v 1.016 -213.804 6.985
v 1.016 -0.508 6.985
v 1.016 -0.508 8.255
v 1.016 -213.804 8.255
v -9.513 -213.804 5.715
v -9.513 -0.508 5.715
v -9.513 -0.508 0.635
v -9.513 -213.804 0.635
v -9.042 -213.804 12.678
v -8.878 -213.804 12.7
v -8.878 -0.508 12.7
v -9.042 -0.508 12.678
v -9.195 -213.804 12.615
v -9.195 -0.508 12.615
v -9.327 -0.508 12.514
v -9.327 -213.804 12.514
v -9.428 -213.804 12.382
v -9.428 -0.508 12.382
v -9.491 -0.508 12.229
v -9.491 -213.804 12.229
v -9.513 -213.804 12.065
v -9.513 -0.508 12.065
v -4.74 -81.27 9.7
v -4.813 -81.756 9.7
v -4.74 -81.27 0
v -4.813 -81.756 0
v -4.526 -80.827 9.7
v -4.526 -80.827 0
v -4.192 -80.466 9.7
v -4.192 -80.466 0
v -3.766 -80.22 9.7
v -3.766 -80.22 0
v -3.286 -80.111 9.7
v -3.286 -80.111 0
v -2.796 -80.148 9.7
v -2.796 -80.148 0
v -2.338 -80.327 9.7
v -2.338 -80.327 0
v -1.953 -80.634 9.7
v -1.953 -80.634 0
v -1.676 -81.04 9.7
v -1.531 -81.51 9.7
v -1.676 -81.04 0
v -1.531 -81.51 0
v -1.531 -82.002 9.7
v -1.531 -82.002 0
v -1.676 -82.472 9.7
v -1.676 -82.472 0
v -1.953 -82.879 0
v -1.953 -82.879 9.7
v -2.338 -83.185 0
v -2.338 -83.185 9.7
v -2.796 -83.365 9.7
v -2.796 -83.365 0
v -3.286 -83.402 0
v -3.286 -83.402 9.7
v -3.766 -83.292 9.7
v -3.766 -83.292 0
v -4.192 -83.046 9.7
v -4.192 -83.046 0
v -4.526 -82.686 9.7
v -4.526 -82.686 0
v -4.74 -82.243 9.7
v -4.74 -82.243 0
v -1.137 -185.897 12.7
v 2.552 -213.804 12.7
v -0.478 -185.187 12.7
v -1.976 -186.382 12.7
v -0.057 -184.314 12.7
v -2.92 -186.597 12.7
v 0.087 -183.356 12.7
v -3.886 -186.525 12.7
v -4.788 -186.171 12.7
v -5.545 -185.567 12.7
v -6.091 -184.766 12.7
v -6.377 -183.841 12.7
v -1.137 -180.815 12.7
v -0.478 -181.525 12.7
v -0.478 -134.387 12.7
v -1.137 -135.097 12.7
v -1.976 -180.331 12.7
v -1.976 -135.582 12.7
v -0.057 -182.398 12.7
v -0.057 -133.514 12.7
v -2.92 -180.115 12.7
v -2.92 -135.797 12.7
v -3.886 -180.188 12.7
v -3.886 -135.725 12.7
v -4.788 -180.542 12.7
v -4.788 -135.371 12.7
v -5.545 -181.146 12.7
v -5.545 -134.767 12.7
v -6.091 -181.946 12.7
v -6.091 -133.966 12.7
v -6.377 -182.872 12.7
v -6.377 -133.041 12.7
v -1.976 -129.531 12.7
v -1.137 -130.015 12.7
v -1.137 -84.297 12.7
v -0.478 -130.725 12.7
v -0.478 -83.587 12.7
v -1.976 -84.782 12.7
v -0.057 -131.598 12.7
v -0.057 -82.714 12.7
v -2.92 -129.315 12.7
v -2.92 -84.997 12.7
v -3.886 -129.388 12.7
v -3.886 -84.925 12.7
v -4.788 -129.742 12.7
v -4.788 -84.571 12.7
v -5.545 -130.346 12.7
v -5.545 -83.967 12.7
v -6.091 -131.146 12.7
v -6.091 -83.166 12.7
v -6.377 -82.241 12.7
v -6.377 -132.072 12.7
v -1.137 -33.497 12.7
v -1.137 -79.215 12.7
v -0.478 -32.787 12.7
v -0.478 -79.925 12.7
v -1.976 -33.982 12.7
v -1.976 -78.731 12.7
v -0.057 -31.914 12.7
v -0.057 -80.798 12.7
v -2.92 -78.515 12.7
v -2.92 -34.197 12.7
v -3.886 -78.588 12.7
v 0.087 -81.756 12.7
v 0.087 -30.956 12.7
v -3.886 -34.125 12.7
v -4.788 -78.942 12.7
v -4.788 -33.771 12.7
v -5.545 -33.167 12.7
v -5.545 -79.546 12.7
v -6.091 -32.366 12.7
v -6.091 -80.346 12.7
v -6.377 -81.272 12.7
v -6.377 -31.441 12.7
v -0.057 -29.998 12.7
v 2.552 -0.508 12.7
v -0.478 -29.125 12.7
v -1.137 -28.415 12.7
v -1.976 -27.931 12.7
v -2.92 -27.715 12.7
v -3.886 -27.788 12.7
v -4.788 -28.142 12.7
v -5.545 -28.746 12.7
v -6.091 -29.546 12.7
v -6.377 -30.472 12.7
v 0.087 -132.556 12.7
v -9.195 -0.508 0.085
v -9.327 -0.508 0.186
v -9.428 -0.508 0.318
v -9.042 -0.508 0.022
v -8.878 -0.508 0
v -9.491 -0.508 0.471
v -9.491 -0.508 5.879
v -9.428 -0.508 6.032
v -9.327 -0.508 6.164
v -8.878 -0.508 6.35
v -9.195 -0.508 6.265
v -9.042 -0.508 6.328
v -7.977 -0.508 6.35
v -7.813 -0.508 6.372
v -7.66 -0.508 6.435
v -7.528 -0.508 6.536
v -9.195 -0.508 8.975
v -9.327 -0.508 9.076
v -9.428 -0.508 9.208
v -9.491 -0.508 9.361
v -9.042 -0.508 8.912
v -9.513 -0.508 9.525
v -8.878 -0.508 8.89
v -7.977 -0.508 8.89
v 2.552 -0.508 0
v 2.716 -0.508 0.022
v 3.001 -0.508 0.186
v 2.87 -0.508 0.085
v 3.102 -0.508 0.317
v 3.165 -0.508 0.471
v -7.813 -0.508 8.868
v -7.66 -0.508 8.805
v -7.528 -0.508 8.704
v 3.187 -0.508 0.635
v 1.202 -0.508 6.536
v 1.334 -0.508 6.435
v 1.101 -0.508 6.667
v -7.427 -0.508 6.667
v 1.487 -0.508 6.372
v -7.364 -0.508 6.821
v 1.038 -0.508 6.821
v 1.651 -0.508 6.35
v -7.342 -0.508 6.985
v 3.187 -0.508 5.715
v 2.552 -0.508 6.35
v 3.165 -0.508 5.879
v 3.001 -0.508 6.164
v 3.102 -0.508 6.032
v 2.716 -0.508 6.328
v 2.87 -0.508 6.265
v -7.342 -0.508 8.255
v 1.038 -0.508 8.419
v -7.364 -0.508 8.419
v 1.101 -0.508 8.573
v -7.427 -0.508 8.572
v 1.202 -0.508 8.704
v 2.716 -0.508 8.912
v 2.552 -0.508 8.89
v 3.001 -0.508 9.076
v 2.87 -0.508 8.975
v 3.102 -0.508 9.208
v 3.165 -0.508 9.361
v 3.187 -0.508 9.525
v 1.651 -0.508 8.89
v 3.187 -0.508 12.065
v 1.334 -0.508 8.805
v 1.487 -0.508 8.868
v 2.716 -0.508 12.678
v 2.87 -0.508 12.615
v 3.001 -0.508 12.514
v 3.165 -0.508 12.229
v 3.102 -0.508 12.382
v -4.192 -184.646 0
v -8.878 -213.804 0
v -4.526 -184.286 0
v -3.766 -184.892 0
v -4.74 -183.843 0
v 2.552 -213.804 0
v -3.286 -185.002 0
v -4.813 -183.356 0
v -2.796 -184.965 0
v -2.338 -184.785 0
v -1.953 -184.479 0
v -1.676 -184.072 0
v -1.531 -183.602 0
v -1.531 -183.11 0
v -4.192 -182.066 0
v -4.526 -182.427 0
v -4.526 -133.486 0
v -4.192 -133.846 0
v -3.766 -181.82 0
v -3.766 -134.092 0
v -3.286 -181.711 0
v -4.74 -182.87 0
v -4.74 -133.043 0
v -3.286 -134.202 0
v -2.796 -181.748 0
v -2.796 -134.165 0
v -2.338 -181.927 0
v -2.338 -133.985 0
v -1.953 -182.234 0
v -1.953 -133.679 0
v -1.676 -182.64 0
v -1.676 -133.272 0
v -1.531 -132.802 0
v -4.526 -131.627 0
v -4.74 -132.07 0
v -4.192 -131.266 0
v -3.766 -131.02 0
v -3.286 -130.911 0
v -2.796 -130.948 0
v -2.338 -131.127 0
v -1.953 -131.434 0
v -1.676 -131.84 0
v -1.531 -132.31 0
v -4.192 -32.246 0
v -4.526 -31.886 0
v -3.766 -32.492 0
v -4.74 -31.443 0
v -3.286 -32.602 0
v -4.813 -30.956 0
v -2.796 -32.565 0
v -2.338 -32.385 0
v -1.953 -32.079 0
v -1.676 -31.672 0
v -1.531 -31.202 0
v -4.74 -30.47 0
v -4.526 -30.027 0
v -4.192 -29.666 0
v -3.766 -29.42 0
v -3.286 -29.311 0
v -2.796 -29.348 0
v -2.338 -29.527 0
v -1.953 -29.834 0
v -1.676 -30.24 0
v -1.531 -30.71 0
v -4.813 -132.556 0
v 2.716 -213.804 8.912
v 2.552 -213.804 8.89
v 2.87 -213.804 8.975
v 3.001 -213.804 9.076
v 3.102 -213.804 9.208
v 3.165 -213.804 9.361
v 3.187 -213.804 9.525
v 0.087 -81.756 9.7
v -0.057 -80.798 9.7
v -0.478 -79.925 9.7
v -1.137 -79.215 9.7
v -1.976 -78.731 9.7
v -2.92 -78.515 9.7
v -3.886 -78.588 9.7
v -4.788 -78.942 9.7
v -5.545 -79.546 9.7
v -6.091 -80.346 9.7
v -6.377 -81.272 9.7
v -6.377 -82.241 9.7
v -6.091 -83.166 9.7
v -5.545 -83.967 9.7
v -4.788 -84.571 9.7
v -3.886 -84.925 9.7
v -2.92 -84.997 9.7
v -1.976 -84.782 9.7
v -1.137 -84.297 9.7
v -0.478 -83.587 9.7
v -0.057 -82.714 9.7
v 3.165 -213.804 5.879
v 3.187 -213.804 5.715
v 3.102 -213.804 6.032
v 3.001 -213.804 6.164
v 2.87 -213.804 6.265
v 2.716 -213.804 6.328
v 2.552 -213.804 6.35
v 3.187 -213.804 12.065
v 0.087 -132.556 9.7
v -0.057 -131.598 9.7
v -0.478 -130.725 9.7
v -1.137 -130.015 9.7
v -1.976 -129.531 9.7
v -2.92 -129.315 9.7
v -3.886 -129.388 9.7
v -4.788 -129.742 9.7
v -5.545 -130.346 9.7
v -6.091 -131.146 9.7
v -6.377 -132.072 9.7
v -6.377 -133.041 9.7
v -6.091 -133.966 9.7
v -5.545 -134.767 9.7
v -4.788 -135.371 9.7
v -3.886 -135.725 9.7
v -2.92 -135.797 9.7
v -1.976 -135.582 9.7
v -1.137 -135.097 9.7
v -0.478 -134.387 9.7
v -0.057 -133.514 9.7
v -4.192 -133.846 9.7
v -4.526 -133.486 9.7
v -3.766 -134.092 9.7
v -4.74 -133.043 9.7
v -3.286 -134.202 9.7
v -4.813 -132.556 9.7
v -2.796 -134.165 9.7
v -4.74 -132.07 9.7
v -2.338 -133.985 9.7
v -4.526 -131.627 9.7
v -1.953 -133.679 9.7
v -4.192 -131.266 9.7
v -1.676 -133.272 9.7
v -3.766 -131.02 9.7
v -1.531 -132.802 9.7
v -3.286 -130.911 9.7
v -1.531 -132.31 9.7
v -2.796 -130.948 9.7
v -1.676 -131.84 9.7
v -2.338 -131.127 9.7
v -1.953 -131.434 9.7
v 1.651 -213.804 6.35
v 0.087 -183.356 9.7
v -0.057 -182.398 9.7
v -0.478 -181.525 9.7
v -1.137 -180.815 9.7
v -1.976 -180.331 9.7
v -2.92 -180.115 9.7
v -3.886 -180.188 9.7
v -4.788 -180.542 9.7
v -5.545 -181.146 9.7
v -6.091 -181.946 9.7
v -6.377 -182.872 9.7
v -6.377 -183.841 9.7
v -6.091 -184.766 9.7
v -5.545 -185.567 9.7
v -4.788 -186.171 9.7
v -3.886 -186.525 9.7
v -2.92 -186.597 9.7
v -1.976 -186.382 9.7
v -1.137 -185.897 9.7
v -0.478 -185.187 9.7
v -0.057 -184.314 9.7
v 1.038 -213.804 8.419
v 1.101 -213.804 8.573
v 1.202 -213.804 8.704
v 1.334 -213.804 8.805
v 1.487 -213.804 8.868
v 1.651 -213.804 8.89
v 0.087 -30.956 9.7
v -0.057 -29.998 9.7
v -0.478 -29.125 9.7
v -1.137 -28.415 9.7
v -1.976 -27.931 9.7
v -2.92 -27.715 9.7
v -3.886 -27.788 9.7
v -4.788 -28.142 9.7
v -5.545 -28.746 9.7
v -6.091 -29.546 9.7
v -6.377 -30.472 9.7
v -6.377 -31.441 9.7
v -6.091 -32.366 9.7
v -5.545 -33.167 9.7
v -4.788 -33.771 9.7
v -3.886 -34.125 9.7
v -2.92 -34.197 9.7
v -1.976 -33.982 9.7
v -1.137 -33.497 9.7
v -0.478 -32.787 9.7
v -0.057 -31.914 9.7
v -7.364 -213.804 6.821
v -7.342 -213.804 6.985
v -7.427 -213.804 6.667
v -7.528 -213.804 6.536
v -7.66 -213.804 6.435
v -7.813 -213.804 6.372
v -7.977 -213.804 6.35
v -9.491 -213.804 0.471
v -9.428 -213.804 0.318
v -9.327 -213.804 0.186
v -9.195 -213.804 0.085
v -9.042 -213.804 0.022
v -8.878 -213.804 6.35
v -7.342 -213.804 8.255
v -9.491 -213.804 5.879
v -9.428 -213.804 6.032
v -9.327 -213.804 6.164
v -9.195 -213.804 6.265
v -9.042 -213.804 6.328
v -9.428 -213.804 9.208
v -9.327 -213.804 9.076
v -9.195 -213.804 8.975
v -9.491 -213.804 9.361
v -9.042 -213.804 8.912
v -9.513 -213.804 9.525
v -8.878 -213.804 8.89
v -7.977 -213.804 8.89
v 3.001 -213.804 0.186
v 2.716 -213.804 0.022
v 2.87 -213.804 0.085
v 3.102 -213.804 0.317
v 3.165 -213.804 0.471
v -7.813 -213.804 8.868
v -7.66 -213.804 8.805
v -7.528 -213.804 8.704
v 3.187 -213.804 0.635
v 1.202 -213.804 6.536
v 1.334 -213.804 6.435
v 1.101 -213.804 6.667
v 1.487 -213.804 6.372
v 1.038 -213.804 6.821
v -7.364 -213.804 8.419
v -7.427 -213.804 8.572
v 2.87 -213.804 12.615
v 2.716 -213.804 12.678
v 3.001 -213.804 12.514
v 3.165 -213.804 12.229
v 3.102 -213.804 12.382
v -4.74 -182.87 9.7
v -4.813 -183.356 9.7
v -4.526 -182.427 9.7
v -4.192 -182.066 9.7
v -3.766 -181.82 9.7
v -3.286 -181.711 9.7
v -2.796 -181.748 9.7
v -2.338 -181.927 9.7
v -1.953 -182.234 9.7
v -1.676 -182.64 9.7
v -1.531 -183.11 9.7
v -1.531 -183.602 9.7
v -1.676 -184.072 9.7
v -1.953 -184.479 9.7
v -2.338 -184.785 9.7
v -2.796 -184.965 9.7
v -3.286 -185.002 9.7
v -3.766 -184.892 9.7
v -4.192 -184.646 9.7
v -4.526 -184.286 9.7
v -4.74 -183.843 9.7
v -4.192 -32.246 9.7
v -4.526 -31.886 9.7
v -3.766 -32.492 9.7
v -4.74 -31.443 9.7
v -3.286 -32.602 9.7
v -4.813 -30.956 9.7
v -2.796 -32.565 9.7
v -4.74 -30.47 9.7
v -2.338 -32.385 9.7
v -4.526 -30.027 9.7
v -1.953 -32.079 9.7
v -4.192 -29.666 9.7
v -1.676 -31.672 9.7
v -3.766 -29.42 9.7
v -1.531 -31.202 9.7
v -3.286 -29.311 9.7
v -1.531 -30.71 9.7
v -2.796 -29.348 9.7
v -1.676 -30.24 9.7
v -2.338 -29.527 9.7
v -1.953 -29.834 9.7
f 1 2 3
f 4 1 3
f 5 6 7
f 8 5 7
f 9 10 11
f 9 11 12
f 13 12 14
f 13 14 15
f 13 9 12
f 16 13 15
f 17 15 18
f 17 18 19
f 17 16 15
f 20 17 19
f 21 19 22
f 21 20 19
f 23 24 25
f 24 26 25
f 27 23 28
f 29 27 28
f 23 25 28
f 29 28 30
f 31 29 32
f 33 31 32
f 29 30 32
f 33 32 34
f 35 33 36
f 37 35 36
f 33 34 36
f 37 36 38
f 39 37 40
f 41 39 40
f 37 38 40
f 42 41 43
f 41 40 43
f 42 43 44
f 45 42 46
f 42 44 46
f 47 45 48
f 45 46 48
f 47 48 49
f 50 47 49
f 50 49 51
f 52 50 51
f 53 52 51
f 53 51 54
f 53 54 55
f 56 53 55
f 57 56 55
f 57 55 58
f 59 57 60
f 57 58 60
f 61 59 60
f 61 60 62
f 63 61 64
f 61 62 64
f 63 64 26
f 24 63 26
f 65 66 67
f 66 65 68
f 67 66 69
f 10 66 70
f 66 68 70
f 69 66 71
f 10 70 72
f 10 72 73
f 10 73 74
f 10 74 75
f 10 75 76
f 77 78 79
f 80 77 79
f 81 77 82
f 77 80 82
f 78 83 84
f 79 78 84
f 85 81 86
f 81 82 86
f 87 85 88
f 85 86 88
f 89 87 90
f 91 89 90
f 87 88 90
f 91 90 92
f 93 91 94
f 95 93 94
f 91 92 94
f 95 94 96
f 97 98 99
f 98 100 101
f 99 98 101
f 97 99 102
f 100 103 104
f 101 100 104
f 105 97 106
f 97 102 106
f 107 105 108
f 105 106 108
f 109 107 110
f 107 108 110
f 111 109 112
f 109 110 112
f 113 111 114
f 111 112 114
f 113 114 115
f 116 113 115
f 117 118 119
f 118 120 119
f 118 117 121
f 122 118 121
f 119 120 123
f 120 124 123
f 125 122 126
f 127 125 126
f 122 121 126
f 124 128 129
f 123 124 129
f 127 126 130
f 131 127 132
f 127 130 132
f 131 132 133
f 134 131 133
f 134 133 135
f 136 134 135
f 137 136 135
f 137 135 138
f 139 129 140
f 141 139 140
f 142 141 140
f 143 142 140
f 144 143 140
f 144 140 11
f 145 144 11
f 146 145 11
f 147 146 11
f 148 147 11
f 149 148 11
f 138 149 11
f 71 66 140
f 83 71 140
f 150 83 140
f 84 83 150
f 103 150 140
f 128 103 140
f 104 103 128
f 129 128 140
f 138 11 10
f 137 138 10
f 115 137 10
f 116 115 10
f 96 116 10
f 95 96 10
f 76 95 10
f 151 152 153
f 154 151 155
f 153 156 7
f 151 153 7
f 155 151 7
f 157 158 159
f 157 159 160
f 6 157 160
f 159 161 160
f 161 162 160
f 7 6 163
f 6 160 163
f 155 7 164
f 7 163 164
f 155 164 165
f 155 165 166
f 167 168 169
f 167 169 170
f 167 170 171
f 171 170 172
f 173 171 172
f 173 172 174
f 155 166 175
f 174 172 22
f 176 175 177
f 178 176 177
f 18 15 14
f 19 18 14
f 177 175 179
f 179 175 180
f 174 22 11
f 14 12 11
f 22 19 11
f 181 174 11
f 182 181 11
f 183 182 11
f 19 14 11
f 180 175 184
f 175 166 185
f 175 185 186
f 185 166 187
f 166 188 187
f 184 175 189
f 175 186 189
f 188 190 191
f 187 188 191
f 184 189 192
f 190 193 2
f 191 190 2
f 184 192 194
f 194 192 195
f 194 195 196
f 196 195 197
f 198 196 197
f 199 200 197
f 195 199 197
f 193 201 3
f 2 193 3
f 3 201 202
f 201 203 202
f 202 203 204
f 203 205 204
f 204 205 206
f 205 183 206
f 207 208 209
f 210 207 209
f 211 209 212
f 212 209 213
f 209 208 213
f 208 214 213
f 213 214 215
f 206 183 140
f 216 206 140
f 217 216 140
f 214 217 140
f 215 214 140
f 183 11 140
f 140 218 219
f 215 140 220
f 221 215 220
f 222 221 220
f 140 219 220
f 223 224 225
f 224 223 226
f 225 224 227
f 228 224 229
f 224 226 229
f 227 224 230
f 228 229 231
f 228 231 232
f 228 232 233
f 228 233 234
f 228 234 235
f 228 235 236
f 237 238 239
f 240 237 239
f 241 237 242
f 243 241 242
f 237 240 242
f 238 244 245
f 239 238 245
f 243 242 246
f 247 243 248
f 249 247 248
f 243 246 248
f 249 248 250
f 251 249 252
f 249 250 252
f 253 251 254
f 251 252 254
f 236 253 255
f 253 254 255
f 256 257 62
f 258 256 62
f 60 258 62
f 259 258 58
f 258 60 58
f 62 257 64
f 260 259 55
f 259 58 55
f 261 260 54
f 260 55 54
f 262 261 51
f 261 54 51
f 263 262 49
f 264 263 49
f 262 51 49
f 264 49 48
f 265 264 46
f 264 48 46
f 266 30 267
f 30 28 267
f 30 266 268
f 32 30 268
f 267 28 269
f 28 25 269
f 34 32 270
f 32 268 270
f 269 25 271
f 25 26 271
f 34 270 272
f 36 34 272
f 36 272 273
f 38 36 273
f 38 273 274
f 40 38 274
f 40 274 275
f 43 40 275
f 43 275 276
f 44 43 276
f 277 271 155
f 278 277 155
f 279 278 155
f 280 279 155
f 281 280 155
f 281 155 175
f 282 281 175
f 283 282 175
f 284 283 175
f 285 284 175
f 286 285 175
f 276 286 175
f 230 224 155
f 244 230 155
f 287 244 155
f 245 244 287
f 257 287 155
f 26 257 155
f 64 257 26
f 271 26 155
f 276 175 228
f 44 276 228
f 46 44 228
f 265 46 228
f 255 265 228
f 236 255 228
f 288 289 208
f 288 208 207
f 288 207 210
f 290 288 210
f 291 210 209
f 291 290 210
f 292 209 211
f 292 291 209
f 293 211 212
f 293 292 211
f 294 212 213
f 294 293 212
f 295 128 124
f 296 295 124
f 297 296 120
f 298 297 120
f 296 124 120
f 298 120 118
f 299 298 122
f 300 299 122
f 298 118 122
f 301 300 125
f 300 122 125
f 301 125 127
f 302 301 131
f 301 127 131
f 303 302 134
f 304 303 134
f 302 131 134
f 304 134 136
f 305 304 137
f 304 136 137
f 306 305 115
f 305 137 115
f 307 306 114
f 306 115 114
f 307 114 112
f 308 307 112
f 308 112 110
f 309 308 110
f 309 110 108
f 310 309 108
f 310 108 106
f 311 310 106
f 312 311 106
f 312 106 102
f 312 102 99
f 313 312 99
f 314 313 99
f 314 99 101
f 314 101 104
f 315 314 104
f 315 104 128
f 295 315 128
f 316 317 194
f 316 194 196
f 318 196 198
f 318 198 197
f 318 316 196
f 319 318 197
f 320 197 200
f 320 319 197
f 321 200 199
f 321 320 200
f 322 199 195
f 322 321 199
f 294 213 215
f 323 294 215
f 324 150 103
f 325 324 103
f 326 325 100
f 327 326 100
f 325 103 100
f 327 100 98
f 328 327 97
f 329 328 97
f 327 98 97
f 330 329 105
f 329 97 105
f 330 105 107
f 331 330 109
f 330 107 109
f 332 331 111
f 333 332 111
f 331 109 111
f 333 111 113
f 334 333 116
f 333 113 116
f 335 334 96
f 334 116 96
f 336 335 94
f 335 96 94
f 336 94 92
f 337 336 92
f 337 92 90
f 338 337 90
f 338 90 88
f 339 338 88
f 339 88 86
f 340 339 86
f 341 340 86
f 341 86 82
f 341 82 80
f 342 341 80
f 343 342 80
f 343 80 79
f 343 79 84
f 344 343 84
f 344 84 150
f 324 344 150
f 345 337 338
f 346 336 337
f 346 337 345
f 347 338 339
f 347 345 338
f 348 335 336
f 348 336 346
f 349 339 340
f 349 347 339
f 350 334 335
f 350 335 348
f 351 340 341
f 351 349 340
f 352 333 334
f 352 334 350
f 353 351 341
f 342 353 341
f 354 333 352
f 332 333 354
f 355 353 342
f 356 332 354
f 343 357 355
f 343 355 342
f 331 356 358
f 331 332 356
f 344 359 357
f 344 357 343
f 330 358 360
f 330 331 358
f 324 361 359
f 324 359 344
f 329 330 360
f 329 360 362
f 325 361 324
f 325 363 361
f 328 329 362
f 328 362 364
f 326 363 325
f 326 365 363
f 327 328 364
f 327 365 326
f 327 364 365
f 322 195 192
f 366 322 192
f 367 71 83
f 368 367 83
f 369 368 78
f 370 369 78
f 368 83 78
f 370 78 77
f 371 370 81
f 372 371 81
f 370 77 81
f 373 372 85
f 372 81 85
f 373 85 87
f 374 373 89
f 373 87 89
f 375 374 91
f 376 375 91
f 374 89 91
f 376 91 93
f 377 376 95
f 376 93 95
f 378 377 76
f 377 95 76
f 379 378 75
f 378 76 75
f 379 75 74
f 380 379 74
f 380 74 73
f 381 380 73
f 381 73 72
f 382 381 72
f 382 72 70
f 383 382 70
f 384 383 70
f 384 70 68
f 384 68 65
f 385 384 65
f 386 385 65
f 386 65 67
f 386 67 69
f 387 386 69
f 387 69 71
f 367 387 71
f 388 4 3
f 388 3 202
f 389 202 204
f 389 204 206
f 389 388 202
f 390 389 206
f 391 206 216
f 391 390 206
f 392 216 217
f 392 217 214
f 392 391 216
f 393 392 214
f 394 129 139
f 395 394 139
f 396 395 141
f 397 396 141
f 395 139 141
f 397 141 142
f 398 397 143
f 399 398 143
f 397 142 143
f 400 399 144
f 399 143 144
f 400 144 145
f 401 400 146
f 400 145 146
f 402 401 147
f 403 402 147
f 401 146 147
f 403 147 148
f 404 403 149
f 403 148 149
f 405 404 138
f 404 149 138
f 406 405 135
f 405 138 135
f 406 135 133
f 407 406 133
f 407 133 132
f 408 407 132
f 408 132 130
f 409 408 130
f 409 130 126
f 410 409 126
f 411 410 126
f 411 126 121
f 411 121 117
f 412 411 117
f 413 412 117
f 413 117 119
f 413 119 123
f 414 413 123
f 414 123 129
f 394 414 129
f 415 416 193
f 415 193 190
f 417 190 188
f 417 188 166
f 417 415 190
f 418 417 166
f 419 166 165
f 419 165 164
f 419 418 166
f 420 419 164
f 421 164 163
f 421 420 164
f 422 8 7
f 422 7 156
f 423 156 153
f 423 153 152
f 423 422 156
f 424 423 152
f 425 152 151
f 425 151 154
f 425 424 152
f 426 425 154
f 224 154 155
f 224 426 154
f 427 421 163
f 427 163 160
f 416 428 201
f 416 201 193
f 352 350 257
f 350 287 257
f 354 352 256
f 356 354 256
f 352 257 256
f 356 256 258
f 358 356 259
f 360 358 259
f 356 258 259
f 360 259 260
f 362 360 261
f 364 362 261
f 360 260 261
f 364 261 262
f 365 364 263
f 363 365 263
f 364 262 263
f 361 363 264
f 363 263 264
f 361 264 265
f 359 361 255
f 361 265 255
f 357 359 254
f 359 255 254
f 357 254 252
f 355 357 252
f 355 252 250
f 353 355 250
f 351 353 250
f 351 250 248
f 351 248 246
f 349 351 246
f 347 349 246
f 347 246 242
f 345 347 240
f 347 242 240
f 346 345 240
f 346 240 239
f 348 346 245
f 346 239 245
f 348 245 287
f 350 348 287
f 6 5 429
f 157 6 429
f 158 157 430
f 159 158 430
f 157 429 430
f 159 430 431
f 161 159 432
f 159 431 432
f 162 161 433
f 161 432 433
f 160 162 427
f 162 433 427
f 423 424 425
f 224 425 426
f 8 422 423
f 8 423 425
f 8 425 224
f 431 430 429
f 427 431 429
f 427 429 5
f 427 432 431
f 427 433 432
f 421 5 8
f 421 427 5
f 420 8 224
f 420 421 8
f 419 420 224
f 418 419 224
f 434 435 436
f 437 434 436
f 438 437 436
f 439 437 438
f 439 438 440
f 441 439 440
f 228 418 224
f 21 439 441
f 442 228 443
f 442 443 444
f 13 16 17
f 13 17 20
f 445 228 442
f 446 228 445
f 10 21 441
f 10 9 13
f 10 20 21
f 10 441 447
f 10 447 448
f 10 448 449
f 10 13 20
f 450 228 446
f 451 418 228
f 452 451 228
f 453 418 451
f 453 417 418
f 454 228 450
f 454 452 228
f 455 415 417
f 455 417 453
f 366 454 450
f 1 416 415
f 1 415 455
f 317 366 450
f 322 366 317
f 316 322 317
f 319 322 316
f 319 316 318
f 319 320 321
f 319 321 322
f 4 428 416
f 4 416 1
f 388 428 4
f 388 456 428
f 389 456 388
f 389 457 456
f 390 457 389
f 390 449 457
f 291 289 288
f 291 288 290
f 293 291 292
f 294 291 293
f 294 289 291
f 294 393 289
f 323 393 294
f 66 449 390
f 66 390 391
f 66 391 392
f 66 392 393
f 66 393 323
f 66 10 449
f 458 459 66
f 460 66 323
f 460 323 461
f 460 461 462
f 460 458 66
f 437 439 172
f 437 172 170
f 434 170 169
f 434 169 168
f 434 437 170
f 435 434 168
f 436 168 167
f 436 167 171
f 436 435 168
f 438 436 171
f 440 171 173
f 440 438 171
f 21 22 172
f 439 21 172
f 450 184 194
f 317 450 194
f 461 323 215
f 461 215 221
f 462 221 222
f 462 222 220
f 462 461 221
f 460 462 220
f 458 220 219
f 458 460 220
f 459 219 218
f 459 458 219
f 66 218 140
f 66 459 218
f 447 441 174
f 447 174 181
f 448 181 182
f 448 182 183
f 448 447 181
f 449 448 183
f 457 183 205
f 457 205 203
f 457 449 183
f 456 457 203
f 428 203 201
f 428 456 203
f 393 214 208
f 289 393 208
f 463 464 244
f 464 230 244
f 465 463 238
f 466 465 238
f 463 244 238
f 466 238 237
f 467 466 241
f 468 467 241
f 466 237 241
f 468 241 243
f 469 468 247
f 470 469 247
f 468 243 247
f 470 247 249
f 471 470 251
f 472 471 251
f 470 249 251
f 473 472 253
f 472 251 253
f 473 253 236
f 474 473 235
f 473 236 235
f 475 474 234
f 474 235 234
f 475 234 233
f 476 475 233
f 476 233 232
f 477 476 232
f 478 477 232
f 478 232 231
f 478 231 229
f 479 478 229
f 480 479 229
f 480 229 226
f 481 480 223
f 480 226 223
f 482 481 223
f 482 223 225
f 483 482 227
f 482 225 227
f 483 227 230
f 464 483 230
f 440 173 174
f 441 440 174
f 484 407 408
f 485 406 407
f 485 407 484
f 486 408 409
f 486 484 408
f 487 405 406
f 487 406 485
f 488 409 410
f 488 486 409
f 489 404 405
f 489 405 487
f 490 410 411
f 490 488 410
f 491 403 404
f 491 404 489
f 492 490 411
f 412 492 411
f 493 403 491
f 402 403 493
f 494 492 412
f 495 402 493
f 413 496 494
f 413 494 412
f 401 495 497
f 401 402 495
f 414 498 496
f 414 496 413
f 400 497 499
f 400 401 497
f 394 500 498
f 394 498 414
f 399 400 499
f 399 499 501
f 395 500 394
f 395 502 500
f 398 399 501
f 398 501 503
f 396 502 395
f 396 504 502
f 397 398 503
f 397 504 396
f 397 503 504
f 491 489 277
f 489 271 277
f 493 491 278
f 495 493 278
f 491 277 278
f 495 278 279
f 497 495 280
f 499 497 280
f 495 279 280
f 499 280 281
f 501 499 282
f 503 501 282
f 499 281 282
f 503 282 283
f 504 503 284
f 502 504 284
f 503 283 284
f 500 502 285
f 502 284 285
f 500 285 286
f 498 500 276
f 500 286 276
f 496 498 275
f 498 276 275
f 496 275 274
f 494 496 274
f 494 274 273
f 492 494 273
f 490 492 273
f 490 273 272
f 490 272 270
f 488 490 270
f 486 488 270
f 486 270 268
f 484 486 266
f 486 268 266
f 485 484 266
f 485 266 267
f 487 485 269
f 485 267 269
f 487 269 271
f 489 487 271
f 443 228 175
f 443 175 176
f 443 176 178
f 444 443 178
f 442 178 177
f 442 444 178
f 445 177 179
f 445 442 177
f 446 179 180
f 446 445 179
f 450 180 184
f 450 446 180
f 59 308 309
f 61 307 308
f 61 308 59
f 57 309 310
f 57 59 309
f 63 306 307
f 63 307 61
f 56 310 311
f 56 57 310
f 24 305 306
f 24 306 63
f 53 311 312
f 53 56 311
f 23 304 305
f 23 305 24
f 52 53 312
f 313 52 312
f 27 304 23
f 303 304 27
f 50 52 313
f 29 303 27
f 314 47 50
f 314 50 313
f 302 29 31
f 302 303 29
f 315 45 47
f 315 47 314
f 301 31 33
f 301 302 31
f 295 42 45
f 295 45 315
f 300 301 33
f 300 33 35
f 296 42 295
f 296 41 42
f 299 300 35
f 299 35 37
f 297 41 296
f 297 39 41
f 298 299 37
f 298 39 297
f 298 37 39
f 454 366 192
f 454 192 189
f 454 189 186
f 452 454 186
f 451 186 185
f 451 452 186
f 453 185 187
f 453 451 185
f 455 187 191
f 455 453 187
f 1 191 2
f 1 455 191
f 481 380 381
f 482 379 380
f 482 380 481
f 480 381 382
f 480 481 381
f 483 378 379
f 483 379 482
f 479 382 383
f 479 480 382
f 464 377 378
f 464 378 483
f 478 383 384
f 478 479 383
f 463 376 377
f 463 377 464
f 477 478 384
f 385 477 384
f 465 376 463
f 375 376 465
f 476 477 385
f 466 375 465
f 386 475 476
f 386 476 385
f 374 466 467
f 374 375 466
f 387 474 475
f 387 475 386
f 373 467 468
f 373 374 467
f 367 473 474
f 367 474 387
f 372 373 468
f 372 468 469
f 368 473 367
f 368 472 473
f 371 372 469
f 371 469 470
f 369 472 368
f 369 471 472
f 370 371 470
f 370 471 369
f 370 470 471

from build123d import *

# Parameters (mm, degrees)
F1_DEPTH       = 214.3125
F2_R           = 0.635
F4_D           = 3.3
F4_DEPTH       = 14.4876
F4_CBORE_D     = 6.5
F4_CBORE_DEPTH = 3
F4_TIP         = 0.9914200214
F5_DEPTH       = 0.508
F6_DEPTH       = 0.508


with BuildPart() as f1:
    # F0 (on Front) → F1 (new body)
    with BuildSketch(Plane.XZ):
        Polygon((-9.5129261665, 6.35), (-9.5129261665, 0), (3.1870738335, 0), (3.1870738335, 6.35), (1.0164155129, 6.35), (1.0164155129, 8.89), (3.1870738335, 8.89), (3.1870738335, 12.7), (-9.5129261665, 12.7), (-9.5129261665, 8.89), (-7.3422678459, 8.89), (-7.3422678459, 6.35), align=None)
    extrude(amount=F1_DEPTH)

    # F2
    f2_edges = [f1.edges().sort_by_distance(p)[0] for p in [
        (3.187074, -107.15625, 8.89),
        (-9.512926, -107.15625, 8.89),
        (-7.342268, -107.15625, 8.89),
        (-7.342268, -107.15625, 6.35),
        (-9.512926, -107.15625, 6.35),
        (1.016416, -107.15625, 6.35),
        (3.187074, -107.15625, 6.35),
        (1.016416, -107.15625, 8.89),
        (3.187074, -107.15625, 12.7),
        (-9.512926, -107.15625, 12.7),
        (-9.512926, -107.15625, 0),
        (3.187074, -107.15625, 0),
    ]]
    fillet(f2_edges, radius=F2_R)

    # F4
    with Locations(Plane.XY.offset(12.7)):
        with Locations((-3.1629261665, -30.95625), (-3.1629261665, -81.75625), (-3.1629261665, -132.55625), (-3.1629261665, -183.35625)):
            CounterBoreHole(F4_D / 2, F4_CBORE_D / 2, F4_CBORE_DEPTH, depth=F4_DEPTH)
            with Locations((0, 0, -(F4_DEPTH + F4_TIP / 2))):  # 118° drill point
                Cone(0, F4_D / 2, F4_TIP, mode=Mode.SUBTRACT)

    # F5 (cut): a face of the model
    f5_faces = [f1.faces().sort_by_distance(p)[0] for p in [
        (-3.1629261665, -214.3125, 6.2565868028),
    ]]
    extrude(f5_faces, amount=-F5_DEPTH, mode=Mode.SUBTRACT)

    # F6 (cut): a face of the model
    f6_faces = [f1.faces().sort_by_distance(p)[0] for p in [
        (-3.1629261665, 0, 6.2565868028),
    ]]
    extrude(f6_faces, amount=-F6_DEPTH, mode=Mode.SUBTRACT)


solid = f1.part
